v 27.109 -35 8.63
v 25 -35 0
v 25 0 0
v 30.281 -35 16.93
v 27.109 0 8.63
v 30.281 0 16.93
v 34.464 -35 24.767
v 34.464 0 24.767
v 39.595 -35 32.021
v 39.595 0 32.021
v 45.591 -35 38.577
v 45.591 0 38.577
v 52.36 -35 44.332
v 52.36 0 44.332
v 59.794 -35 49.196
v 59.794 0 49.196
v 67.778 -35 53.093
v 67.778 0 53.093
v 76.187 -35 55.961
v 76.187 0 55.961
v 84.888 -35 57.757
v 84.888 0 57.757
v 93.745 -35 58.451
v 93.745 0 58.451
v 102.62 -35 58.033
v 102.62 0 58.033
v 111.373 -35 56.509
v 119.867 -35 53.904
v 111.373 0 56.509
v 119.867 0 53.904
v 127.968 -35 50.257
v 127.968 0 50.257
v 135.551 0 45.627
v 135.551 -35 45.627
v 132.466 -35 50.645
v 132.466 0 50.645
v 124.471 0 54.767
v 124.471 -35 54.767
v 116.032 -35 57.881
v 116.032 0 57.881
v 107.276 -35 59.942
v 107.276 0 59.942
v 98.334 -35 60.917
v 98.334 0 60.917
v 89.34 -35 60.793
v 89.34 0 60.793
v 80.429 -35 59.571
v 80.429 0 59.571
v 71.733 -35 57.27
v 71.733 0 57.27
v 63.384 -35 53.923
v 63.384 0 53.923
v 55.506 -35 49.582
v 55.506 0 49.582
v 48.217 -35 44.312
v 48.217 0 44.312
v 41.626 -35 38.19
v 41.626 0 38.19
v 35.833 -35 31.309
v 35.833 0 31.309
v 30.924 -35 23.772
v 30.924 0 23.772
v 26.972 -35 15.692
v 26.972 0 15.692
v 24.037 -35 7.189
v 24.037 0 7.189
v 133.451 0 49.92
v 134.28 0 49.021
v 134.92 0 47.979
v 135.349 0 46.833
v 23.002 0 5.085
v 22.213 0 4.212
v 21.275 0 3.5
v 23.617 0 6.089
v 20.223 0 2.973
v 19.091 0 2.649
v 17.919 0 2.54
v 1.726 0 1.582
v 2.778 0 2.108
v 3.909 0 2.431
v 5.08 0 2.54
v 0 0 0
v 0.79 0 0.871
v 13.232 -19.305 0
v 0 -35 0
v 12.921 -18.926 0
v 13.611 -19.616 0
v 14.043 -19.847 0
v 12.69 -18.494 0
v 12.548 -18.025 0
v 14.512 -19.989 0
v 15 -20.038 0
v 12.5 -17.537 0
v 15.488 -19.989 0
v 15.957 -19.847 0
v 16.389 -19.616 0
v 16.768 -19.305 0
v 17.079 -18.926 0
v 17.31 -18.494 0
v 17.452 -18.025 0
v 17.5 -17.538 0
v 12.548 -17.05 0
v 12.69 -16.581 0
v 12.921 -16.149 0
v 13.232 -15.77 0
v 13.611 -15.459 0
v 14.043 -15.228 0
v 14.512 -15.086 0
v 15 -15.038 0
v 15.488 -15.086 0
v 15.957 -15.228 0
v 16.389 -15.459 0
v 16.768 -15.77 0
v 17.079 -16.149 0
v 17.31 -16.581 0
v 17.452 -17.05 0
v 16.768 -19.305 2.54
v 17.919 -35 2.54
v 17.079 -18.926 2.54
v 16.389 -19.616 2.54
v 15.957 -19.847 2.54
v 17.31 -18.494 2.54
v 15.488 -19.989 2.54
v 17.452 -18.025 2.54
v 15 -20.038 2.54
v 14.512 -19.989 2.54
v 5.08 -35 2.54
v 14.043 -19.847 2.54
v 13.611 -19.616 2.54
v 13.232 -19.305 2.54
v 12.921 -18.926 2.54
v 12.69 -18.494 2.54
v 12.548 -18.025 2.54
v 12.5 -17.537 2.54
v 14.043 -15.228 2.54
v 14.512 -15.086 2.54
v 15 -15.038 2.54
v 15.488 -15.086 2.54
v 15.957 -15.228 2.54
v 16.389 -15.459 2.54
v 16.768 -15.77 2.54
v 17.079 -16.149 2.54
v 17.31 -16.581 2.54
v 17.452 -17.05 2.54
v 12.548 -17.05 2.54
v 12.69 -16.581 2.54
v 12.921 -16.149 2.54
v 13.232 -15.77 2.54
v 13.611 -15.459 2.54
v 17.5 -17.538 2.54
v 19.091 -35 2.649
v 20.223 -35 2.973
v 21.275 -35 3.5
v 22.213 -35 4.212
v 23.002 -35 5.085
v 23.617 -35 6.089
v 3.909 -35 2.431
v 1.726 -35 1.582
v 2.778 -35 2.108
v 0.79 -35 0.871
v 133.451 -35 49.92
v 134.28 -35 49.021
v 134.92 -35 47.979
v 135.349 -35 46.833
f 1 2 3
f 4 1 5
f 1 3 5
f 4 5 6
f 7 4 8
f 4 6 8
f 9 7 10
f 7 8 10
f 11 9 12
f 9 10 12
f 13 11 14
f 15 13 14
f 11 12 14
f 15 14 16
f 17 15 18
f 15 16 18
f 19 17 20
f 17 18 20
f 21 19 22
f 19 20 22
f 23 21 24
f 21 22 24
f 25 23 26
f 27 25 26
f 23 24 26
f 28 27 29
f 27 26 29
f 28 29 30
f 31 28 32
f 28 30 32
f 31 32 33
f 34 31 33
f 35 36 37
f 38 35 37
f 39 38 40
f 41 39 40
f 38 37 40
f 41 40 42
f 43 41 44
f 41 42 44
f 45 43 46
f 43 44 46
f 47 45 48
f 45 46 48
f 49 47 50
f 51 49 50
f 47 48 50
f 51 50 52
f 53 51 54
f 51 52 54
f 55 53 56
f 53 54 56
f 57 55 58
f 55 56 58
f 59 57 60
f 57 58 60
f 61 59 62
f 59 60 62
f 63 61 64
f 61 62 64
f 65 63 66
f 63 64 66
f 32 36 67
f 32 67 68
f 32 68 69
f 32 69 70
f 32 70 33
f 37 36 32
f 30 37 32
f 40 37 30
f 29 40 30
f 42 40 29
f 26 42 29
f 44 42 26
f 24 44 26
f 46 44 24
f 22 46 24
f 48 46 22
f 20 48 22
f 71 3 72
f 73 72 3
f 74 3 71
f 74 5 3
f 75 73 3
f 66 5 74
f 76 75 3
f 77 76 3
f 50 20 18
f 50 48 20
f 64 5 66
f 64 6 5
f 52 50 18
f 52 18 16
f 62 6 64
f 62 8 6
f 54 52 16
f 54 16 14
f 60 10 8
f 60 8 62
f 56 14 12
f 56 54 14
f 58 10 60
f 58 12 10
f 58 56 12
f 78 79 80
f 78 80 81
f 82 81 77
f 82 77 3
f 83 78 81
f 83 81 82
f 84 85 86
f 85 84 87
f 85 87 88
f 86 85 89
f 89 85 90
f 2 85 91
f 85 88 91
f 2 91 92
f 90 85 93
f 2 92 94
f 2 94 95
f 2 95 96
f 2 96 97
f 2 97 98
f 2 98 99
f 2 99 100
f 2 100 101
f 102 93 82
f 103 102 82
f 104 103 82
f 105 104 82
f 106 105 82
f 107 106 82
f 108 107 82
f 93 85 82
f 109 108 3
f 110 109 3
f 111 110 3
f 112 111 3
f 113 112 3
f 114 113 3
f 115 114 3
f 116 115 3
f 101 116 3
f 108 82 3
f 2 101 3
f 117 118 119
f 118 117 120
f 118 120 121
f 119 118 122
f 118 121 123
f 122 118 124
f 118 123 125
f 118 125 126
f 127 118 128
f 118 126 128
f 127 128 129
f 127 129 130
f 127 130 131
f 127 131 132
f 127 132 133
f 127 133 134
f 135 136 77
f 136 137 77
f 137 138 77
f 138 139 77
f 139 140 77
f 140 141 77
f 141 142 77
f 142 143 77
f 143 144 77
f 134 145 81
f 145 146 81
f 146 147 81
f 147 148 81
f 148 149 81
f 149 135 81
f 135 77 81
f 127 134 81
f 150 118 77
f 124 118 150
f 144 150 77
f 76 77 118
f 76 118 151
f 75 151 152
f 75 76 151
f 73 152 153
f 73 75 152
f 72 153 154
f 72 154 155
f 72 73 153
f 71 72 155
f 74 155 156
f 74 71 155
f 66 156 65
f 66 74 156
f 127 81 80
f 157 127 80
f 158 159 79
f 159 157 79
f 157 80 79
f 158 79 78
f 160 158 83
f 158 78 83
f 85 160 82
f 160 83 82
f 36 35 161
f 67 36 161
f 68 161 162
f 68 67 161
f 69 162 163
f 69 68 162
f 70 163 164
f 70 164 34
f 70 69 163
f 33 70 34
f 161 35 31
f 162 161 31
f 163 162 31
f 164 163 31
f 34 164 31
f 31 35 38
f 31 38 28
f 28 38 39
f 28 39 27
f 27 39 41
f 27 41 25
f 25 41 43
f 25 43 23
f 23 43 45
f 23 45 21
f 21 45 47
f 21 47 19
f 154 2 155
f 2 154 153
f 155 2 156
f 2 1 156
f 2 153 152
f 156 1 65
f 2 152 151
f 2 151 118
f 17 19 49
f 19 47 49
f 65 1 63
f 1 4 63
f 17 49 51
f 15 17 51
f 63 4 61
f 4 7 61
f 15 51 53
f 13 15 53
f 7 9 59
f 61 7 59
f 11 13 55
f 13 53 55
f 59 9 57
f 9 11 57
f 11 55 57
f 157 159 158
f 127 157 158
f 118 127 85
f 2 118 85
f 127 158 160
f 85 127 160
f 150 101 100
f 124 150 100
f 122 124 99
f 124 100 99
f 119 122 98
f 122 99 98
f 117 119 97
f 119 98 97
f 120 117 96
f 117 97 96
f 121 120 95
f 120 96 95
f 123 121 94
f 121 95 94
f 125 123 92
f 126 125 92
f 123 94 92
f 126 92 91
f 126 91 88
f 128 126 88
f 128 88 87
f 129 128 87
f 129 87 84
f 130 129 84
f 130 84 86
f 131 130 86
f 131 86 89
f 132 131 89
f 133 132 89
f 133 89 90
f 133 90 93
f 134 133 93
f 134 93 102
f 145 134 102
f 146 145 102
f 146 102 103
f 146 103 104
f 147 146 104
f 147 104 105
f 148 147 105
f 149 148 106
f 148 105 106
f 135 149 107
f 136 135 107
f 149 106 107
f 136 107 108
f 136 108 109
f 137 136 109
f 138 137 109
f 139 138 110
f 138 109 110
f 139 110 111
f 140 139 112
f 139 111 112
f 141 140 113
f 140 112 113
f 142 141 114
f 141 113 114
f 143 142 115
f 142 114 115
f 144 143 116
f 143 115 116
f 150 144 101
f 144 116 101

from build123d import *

# Parameters (mm, degrees)
F1_DEPTH    = 35
F2_T1_DEPTH = 35
F2_T3_DEPTH = 60.4
F2_T5_DEPTH = 62.0452734599
F3_R        = 2.5
F4_DEPTH    = 61.0006540296


# Not quite as in the source:
# - a fillet or chamfer that OpenCascade refuses, or shapes differently, is made with other operations: its cross-section is extruded or revolved along the edge and cut away or added


with BuildPart() as f1:
    # F0 (on Front) → F1 (new body)
    with BuildSketch(Plane.XZ):
        with BuildLine():
            Line((0, 2.54), (0, 0))
            Line((0, 0), (25, 0))
            ThreePointArc((25, 0), (67.7784437716, 53.0927080046), (135.550785483, 45.6267456604))
            Line((135.550785483, 45.6267456604), (137.0076696313, 47.7073918529))
            ThreePointArc((137.0076696313, 47.7073918529), (67.7975373338, 55.8400571127), (22.9055940849, 2.54))
            Line((22.9055940849, 2.54), (0, 2.54))
        make_face()
    extrude(amount=F1_DEPTH)

    # F2: fillet of radius 6.35 on 3 edges, made by hand

    # F2_s2 → F2_t1 (join)
    with BuildSketch(Plane.XZ):
        with BuildLine():
            ThreePointArc((17.9186335189, 2.54), (21.7605713102, 3.8341109577), (24.0365583001, 7.1889719661))
            ThreePointArc((24.0365583001, 7.1889719661), (23.4332372688, 4.8736911297), (22.9055940849, 2.54))
            Line((22.9055940849, 2.54), (17.9186335189, 2.54))
        make_face()
    extrude(amount=F2_T1_DEPTH)

    # F2_s4 → F2_t3 (cut)
    with BuildSketch(Plane.XZ.offset(-12.7)):
        with BuildLine():
            ThreePointArc((5.08, 2.54), (2.2401936686, 1.8696126628), (0, 0))
            Line((0, 0), (0, 2.54))
            Line((0, 2.54), (5.08, 2.54))
        make_face()
    extrude(amount=F2_T3_DEPTH, mode=Mode.SUBTRACT)

    # F2_s6 → F2_t5 (cut)
    with BuildSketch(Plane.XZ.offset(-13.52263673)):
        with BuildLine():
            ThreePointArc((132.4656708106, 50.6447579134), (134.6252880595, 48.5151252309), (135.550785483, 45.6267456604))
            Line((135.550785483, 45.6267456604), (137.0076696313, 47.7073918529))
            ThreePointArc((137.0076696313, 47.7073918529), (134.7637005445, 49.2178714094), (132.4656708106, 50.6447579134))
        make_face()
    extrude(amount=F2_T5_DEPTH, mode=Mode.SUBTRACT)

    # F3 (on face) → F4 (cut, through all)
    with BuildSketch(Plane(origin=(0, 0, 0), x_dir=(1, 0, 0), z_dir=(0, 0, -1))):
        with Locations((15, 17.5375)):
            Circle(F3_R)
    extrude(amount=-F4_DEPTH, mode=Mode.SUBTRACT)


solid = f1.part
